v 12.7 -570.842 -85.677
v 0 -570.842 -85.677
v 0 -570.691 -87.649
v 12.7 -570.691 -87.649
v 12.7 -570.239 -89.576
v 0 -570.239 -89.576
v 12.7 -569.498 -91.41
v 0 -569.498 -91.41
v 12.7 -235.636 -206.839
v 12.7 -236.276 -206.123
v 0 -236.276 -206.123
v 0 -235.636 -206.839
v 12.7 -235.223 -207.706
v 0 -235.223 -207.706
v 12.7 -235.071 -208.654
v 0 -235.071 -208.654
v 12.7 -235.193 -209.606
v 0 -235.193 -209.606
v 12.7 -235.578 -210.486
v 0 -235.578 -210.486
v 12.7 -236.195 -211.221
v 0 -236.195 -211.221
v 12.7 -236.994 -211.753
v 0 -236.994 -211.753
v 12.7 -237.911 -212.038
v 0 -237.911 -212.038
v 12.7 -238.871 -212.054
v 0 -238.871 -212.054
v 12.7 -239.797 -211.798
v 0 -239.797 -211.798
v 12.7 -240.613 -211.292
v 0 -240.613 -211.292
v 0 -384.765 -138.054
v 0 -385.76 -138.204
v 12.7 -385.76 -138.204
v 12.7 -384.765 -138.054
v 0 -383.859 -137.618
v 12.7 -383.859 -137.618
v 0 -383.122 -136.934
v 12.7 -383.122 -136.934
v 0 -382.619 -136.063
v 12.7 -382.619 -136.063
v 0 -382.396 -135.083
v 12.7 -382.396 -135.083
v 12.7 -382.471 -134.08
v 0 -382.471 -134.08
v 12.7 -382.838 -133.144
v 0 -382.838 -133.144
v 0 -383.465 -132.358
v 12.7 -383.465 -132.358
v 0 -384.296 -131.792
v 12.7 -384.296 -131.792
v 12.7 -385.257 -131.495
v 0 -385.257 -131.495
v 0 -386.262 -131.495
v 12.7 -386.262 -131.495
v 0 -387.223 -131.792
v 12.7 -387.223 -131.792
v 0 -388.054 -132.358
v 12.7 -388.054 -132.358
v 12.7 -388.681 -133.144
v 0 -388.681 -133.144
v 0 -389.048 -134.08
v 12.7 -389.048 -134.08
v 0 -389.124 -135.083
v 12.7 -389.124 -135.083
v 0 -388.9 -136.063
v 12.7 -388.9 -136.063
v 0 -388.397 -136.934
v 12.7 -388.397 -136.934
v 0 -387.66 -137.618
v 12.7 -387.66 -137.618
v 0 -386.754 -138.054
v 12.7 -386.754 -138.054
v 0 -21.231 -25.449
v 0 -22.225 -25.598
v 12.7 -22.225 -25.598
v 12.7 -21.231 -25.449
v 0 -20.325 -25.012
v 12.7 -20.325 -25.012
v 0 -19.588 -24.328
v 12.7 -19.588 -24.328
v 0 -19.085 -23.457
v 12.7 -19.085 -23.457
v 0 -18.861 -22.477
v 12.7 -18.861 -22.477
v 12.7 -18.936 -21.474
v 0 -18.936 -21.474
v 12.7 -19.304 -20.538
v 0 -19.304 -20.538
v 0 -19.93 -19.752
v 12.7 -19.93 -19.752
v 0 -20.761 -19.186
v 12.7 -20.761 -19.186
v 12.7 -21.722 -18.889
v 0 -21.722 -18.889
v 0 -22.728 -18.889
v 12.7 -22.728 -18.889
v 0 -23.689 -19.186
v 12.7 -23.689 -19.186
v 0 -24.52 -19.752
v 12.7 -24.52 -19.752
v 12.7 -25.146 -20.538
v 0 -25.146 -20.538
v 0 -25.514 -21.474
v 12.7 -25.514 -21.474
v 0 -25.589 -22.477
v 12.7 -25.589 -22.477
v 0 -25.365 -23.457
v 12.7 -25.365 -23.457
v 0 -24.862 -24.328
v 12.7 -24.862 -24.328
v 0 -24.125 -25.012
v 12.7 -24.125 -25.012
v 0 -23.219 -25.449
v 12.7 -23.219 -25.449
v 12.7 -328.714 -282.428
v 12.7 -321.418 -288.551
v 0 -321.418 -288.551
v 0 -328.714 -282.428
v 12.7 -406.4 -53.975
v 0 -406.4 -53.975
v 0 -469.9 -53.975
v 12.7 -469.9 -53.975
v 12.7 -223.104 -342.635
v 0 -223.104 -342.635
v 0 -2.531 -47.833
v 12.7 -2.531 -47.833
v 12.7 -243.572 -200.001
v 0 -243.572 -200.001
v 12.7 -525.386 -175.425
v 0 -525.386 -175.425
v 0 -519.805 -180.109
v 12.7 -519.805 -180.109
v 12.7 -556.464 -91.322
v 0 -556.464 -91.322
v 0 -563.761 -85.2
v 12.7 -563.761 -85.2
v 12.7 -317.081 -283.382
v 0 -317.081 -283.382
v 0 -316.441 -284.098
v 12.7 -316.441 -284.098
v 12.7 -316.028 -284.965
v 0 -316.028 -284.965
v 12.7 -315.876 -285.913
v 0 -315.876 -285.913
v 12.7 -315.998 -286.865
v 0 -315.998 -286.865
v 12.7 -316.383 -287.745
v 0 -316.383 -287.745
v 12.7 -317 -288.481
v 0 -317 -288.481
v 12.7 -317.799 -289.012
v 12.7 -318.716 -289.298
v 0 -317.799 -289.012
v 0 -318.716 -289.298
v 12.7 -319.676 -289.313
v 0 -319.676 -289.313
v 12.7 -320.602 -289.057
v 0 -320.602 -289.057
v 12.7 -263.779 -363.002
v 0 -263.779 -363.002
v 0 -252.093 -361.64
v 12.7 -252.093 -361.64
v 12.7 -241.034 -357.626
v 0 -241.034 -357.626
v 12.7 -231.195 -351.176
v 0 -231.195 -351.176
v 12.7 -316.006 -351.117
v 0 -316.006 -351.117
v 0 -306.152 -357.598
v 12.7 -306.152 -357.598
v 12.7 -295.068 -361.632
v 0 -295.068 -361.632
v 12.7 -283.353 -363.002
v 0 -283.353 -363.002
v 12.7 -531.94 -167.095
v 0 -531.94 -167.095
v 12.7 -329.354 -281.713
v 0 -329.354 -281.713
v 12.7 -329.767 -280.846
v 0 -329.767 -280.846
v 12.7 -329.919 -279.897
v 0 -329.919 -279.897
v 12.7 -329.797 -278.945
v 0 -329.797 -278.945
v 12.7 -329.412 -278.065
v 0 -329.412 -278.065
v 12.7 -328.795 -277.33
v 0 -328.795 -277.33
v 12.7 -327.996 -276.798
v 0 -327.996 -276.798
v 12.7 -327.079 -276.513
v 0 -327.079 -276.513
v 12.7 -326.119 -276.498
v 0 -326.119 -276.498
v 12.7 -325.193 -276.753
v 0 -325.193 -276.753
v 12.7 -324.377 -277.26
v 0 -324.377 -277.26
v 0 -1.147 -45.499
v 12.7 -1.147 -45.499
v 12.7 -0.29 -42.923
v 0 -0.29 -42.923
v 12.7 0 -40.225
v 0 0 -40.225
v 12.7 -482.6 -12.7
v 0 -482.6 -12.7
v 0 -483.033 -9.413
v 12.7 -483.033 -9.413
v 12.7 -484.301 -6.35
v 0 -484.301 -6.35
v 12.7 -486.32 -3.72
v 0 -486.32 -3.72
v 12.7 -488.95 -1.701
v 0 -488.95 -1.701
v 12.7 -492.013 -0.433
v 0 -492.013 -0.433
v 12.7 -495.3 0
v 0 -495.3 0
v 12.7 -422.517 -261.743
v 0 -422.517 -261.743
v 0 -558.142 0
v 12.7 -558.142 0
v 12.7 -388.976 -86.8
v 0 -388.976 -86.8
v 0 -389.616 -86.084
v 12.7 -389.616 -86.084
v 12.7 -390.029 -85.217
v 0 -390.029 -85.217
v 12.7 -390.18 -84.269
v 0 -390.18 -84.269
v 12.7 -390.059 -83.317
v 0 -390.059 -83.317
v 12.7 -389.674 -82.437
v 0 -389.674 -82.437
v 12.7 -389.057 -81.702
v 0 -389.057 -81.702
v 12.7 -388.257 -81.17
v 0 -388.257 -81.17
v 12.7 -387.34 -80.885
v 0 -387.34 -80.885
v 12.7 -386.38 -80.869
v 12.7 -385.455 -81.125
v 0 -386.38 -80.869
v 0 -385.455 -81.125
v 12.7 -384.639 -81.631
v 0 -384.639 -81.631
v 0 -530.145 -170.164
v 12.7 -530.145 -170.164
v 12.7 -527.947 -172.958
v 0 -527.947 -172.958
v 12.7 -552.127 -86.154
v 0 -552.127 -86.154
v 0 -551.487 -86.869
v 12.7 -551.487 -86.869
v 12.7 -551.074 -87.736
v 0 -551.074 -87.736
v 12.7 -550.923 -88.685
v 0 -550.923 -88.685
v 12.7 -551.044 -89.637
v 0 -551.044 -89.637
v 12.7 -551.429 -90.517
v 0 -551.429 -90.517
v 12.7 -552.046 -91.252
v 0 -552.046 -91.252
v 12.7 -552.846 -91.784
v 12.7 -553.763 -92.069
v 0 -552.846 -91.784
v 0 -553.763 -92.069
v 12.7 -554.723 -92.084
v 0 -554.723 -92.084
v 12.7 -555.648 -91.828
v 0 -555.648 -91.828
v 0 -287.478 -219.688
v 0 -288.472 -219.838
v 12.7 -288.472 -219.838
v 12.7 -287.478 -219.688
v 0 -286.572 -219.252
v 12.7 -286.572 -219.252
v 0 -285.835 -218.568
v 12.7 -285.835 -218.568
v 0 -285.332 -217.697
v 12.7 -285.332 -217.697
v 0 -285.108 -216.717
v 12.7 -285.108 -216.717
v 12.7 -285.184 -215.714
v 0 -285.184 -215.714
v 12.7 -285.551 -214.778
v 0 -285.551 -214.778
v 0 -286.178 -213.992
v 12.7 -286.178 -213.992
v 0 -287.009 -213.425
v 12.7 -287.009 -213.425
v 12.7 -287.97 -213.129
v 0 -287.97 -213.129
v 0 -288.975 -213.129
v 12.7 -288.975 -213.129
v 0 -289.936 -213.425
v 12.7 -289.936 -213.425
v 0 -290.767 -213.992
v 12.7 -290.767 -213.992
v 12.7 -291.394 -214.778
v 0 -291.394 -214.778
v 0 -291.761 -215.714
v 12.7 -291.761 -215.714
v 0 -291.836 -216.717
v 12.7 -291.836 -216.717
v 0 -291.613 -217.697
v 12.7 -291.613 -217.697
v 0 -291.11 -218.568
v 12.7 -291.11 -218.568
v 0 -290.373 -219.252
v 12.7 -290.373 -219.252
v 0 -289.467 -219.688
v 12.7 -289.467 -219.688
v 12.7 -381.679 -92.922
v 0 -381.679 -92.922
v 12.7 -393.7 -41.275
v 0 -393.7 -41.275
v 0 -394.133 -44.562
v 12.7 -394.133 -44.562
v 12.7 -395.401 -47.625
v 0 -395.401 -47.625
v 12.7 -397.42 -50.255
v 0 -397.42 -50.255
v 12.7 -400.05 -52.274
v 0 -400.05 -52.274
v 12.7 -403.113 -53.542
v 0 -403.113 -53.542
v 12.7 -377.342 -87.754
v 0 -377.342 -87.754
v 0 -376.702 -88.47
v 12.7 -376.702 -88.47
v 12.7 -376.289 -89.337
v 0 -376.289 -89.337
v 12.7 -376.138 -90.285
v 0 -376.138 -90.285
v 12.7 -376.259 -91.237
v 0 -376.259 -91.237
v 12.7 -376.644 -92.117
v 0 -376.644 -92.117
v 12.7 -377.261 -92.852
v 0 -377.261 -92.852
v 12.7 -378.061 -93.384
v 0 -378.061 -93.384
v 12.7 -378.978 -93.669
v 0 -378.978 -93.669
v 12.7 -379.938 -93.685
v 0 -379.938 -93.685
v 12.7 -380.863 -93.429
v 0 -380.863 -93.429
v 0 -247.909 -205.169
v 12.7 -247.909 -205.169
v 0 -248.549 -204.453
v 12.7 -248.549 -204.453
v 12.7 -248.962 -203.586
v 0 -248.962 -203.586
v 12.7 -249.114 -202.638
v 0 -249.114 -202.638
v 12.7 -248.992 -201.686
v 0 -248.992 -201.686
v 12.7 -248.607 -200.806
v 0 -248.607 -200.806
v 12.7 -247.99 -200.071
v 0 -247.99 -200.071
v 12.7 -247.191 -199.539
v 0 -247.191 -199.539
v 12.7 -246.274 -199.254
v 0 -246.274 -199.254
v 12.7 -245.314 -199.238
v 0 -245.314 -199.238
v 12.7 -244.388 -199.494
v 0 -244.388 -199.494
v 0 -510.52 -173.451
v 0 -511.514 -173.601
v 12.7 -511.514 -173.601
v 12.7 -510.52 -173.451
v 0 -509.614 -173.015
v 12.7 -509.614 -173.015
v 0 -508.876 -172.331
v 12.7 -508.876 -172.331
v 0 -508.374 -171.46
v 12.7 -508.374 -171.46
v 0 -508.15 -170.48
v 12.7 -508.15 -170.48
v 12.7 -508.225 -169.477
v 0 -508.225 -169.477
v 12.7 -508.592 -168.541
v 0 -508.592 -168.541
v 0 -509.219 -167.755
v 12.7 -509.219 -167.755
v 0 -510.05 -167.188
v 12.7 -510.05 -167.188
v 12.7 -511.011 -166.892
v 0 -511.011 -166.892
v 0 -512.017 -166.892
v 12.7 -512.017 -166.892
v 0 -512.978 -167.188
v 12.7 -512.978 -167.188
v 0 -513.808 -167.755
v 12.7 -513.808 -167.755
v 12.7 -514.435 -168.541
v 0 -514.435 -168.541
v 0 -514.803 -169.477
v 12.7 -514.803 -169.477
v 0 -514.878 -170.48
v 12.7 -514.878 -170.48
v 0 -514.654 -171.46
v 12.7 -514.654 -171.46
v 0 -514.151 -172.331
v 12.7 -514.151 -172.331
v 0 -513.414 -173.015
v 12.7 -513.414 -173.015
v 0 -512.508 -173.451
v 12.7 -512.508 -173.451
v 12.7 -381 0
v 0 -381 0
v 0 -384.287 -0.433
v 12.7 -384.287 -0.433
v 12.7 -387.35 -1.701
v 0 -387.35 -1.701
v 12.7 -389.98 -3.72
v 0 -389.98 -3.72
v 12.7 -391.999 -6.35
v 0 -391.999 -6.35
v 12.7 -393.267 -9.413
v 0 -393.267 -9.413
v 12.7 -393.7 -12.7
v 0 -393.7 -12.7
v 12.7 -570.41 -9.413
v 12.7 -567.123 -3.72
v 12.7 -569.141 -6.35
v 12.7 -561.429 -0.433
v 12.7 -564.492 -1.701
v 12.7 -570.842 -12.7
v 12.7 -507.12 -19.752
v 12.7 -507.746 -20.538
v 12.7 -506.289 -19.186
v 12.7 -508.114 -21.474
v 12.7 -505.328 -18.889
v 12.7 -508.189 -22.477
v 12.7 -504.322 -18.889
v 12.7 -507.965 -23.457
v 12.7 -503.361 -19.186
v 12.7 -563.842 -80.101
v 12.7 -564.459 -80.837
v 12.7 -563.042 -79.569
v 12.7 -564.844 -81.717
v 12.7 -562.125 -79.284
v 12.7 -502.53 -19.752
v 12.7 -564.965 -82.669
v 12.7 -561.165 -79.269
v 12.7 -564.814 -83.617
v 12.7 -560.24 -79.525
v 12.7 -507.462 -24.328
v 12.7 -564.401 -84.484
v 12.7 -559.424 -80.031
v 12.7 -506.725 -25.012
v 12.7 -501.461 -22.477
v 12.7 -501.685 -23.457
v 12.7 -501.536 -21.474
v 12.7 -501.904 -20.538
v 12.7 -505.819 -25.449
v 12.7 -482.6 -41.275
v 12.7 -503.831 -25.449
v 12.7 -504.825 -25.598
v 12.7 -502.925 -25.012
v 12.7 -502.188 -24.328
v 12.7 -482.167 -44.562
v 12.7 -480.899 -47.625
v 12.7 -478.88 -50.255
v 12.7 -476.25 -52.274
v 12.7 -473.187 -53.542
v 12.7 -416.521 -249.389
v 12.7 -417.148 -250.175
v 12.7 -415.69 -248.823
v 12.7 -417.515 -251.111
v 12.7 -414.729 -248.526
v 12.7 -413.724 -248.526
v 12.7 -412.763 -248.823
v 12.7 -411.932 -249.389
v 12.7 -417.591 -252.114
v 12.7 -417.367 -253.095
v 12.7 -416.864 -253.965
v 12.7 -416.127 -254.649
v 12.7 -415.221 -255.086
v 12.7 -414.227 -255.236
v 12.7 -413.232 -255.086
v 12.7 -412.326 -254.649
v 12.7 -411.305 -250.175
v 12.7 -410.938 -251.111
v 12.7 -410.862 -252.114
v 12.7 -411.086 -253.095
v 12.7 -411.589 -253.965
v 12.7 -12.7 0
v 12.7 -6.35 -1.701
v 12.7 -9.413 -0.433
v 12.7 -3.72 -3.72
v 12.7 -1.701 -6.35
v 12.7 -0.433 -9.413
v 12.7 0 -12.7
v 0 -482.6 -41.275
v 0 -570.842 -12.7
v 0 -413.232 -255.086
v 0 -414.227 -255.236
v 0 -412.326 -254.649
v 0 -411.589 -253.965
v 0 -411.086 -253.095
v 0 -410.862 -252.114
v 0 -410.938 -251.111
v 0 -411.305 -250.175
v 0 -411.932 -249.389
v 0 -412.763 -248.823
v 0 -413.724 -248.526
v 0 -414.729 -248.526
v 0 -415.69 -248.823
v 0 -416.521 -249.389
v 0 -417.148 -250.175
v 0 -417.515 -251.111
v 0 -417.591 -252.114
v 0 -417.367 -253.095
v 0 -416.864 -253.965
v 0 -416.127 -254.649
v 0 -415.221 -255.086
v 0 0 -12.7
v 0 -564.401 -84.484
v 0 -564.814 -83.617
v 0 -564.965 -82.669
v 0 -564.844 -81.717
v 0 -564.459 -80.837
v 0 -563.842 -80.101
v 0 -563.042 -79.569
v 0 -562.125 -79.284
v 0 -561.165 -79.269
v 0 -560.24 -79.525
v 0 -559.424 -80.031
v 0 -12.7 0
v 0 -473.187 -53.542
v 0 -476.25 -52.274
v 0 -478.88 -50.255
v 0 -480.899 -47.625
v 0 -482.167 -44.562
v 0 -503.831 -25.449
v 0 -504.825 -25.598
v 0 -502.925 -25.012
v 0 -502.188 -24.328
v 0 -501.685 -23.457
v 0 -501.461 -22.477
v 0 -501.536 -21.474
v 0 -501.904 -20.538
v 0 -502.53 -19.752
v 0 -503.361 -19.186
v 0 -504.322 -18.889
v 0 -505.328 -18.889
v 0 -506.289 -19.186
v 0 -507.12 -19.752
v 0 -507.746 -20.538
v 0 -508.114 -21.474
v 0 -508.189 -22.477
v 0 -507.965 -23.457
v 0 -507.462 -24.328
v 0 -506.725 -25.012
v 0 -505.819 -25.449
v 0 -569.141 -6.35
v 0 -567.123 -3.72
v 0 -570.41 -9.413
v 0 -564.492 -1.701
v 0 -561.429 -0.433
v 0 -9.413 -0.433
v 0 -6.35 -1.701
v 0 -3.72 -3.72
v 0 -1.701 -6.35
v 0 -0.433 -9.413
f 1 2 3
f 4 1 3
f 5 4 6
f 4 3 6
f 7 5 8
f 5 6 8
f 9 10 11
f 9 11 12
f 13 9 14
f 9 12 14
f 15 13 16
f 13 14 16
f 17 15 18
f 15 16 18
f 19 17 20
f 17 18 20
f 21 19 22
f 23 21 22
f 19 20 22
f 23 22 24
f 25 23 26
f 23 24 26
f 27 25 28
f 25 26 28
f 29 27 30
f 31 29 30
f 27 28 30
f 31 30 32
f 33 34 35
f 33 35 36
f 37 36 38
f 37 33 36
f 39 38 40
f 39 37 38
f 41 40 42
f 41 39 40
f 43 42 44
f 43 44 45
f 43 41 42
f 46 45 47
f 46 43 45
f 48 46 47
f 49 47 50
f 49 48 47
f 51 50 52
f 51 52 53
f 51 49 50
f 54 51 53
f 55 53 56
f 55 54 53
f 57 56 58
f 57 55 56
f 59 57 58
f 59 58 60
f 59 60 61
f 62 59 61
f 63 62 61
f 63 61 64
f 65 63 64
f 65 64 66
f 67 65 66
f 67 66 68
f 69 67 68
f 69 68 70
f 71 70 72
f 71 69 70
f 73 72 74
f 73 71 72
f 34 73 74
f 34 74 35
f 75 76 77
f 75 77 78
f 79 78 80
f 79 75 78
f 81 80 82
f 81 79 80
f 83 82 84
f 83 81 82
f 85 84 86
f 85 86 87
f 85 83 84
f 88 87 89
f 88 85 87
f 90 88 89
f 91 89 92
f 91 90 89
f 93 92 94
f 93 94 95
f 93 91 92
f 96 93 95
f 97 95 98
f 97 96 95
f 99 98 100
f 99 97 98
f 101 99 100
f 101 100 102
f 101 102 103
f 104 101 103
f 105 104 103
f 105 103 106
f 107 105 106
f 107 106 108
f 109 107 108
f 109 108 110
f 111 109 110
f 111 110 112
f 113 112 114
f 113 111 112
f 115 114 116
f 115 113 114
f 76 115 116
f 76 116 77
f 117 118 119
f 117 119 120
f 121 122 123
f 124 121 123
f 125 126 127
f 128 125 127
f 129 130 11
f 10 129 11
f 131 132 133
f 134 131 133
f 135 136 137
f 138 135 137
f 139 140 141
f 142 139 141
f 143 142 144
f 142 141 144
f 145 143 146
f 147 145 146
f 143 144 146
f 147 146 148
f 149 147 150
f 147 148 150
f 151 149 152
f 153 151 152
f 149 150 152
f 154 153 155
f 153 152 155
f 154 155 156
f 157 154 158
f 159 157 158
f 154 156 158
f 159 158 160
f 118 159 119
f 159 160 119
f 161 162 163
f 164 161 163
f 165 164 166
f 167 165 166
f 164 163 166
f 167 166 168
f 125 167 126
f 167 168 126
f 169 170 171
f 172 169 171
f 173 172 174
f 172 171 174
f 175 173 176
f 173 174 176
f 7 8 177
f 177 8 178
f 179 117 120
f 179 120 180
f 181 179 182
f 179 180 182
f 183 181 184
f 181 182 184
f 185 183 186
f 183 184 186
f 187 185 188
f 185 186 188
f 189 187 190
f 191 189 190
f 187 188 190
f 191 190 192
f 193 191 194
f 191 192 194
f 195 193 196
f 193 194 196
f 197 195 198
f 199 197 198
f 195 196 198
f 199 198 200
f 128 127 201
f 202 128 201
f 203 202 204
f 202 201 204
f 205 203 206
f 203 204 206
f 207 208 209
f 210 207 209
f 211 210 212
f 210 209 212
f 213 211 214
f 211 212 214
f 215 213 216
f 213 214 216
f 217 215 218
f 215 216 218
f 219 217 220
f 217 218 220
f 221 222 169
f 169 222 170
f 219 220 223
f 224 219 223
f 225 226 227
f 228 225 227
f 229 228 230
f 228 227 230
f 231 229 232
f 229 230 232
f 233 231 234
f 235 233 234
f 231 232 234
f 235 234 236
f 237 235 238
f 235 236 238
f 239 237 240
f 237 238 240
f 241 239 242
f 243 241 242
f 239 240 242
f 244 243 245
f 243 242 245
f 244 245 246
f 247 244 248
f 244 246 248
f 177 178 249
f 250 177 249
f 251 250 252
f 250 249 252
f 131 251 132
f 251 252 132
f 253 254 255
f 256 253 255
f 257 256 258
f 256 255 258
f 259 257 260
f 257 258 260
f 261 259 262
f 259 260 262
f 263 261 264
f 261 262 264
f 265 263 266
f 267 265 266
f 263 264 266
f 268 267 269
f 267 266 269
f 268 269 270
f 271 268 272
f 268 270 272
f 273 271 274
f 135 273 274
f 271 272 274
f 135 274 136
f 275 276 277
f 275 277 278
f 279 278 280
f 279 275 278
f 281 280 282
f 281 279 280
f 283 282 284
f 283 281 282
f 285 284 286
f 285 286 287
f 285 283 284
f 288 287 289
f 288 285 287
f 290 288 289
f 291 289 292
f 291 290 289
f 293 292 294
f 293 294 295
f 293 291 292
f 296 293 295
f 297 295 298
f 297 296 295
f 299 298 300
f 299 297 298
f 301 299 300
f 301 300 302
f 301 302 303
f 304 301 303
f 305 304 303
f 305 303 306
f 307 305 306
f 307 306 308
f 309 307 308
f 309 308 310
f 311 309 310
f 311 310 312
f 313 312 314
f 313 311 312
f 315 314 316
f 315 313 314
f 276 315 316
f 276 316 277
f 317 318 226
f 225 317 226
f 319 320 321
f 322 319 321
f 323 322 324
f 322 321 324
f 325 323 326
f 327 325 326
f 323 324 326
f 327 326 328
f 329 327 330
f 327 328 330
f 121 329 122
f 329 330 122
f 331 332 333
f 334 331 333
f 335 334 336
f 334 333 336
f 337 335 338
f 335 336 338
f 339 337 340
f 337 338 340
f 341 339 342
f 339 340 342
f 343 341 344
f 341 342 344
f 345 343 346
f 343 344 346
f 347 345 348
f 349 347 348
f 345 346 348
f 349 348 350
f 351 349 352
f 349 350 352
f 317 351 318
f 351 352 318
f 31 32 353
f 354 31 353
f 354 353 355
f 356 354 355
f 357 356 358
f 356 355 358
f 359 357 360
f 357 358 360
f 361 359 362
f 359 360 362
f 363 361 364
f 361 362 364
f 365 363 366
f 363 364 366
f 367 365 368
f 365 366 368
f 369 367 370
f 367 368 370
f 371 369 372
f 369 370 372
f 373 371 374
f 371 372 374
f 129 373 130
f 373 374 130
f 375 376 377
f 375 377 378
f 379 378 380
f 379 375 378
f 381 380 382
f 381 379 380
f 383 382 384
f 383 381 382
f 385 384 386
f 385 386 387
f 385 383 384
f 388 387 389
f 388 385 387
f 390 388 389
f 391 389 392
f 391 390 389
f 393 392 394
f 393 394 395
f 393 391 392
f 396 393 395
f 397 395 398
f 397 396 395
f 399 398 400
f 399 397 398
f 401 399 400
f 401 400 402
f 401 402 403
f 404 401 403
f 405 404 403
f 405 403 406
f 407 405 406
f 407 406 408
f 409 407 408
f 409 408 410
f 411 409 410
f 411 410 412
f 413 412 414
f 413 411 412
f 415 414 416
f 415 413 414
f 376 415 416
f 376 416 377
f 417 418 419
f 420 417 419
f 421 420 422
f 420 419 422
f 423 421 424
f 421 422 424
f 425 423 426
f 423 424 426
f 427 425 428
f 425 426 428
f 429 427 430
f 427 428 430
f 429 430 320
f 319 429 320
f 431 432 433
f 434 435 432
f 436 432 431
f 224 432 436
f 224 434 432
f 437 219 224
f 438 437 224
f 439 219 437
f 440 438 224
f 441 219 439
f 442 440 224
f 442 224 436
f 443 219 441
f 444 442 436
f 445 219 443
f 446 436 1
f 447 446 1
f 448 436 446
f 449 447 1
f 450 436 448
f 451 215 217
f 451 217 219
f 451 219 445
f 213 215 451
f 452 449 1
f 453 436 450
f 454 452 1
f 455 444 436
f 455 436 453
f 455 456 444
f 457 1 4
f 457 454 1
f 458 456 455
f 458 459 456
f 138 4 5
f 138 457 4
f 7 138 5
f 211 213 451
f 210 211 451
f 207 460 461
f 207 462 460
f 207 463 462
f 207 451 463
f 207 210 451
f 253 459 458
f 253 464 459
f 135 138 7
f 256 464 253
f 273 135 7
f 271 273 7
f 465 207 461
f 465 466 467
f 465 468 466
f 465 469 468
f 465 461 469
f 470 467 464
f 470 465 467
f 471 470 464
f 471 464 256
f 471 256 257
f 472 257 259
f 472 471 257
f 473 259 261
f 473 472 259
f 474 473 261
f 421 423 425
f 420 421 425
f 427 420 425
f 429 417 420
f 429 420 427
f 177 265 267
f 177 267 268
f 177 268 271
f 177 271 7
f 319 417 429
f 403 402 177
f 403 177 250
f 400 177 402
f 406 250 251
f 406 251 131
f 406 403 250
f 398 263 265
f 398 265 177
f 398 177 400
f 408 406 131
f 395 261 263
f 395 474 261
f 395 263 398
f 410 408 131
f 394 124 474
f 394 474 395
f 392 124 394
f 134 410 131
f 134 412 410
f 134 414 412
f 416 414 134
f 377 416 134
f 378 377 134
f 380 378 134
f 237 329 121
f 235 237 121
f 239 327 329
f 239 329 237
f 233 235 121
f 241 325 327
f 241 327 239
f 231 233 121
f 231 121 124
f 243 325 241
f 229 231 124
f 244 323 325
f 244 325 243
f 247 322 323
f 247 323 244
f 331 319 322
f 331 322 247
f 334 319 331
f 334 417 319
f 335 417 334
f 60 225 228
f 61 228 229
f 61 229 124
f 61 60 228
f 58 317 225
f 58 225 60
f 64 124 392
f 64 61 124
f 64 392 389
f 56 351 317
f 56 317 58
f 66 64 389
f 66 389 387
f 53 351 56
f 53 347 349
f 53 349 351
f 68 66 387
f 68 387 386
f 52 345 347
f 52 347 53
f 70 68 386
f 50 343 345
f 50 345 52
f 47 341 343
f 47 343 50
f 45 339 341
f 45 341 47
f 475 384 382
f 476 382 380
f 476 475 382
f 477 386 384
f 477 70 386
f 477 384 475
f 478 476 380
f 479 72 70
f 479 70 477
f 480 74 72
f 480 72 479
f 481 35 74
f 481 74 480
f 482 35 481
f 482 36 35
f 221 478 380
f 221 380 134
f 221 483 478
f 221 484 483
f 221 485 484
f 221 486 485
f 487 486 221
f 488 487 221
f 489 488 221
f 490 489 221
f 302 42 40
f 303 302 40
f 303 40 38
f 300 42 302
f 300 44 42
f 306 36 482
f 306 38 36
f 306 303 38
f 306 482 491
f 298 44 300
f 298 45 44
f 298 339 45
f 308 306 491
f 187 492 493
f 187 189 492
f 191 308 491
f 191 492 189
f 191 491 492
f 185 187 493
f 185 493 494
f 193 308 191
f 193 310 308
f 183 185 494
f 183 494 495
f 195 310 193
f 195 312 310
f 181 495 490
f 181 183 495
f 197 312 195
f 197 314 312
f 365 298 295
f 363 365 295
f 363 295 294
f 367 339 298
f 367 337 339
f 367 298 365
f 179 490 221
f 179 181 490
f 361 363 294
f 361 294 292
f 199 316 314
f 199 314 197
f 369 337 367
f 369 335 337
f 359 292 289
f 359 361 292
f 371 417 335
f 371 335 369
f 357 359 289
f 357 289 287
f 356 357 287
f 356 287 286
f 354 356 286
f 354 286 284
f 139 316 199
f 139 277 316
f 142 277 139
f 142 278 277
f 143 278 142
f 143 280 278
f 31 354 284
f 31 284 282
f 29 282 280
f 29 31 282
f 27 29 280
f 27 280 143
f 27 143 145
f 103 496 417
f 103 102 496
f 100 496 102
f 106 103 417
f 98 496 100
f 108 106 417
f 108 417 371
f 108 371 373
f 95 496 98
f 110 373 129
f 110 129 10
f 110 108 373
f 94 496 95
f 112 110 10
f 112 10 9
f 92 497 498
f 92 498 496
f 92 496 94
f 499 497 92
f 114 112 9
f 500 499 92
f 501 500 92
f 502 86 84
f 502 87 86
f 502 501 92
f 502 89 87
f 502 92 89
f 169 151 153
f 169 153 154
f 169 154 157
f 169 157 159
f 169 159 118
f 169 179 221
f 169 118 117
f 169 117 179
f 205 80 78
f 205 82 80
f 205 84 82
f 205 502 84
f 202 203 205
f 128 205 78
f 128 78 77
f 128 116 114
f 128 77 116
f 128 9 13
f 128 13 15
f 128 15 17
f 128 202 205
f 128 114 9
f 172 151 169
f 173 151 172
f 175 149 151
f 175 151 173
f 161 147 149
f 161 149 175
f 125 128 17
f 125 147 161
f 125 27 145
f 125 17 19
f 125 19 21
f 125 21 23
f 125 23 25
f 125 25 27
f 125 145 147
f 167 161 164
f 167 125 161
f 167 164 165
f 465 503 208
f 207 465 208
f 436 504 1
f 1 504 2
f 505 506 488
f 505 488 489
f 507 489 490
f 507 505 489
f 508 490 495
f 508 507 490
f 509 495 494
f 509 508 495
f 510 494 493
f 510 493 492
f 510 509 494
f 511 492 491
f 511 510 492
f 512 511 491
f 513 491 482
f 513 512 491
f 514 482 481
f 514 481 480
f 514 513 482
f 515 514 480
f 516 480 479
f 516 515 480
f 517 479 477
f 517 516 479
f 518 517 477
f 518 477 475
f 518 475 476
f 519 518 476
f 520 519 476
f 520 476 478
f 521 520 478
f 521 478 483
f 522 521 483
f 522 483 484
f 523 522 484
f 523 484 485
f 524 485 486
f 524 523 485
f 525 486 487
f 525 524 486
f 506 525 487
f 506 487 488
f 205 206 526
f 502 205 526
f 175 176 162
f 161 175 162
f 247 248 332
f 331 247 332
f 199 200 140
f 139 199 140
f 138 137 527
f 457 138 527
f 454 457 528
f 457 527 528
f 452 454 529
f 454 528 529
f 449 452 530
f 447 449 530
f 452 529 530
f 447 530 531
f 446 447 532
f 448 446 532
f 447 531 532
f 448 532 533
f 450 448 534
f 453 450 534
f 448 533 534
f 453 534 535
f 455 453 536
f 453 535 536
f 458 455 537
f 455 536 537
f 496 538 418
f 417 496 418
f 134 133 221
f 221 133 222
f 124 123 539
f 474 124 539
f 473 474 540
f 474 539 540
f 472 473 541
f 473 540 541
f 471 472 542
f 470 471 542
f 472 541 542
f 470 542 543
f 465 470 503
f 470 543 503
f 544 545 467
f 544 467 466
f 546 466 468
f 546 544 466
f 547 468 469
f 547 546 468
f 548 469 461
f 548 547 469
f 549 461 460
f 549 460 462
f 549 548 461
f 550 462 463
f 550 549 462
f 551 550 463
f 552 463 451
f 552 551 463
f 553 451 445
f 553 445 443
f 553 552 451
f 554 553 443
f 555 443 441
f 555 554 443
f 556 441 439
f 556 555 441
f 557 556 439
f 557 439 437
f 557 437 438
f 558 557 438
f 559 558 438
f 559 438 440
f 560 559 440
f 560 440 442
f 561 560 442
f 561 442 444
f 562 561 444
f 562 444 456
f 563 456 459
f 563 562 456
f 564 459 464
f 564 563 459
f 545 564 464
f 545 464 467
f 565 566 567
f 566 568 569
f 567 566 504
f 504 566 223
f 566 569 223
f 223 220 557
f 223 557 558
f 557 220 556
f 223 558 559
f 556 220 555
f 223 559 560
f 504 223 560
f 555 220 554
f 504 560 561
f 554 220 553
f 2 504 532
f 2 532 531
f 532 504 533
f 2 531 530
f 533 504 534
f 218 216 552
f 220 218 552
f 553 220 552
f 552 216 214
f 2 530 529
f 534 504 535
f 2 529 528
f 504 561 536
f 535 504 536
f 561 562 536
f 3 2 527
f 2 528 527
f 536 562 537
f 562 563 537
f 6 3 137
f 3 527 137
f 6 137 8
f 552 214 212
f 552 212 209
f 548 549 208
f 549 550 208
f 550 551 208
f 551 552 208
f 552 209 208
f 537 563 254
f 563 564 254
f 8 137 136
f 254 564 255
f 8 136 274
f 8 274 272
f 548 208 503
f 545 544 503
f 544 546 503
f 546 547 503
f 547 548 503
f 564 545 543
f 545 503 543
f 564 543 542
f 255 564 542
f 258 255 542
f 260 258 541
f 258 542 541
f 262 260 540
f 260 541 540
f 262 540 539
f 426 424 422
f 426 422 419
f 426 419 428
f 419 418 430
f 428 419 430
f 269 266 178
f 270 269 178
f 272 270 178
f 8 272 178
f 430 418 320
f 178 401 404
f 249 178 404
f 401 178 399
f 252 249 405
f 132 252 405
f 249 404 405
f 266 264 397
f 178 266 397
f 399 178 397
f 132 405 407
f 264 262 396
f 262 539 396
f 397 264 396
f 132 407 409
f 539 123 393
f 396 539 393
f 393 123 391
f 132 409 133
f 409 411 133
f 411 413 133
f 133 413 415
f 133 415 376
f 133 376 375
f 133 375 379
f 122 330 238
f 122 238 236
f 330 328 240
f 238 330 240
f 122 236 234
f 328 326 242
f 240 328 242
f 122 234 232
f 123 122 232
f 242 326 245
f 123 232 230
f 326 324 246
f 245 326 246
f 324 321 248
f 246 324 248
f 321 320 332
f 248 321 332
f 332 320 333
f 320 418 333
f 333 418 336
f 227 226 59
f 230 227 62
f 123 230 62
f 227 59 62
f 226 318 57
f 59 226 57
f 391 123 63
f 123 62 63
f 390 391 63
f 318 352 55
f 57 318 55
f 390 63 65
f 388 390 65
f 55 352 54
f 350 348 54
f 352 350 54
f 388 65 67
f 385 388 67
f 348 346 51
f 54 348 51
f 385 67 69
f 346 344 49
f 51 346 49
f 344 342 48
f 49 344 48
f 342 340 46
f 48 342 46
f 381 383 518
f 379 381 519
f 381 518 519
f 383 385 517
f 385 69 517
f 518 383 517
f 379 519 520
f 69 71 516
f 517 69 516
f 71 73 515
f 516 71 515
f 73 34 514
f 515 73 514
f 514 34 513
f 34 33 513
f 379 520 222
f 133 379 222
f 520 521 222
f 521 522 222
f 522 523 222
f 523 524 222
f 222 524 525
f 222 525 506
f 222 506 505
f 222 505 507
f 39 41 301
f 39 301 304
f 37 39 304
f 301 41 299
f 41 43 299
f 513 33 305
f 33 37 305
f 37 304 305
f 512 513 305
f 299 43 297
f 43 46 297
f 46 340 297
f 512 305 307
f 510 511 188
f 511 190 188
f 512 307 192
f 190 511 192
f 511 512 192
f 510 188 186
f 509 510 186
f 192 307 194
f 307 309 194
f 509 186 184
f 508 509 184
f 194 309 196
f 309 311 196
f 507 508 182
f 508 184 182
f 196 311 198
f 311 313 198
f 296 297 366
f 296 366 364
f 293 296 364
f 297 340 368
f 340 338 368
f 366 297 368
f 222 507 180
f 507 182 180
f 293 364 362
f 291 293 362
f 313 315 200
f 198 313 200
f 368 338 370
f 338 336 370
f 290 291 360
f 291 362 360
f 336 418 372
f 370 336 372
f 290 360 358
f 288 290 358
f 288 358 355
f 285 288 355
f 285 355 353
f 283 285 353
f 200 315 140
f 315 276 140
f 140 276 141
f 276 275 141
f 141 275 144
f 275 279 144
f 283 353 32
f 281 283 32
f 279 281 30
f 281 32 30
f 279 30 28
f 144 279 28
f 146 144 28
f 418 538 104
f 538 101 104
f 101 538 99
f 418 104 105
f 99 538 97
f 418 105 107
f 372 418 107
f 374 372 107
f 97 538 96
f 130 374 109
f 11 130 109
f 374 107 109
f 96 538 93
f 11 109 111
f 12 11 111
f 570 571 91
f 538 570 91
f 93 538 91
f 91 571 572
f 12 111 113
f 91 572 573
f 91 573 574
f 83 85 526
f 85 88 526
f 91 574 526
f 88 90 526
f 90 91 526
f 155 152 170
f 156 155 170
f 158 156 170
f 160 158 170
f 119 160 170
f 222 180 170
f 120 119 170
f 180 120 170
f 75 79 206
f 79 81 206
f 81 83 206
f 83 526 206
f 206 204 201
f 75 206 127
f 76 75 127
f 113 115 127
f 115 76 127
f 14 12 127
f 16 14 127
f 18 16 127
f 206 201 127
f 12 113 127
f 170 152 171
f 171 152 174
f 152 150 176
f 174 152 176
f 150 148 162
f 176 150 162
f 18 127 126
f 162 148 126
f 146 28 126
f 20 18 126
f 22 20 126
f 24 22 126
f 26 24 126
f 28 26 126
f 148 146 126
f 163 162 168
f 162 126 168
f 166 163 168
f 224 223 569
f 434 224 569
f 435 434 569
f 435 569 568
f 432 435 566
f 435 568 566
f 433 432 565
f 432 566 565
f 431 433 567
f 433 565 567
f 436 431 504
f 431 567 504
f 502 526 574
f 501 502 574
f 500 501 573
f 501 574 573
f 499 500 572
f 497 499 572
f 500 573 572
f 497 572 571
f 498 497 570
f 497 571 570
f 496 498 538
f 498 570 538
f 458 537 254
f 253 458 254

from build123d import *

# Parameters (mm, degrees)
SKETCH1_R           = 3.3734375
BOSS_EXTRUDE1_DEPTH = 12.7


with BuildPart() as part:
    # Sketch1 → Boss-Extrude1 (new body)
    with BuildSketch(Plane(origin=(0, 0, 0), x_dir=(0, 0, -1), z_dir=(1, 0, 0))):
        with BuildLine():
            Line((0, -12.7), (0, -381))
            ThreePointArc((0, -381), (3.719743879, -389.980256121), (12.7, -393.7))
            Line((12.7, -393.7), (41.275, -393.7))
            ThreePointArc((41.275, -393.7), (50.255256121, -397.419743879), (53.975, -406.4))
            Line((53.975, -406.4), (53.975, -469.9))
            ThreePointArc((53.975, -469.9), (50.255256121, -478.880256121), (41.275, -482.6))
            Line((41.275, -482.6), (12.7, -482.6))
            ThreePointArc((12.7, -482.6), (3.719743879, -486.319743879), (0, -495.3))
            Line((0, -495.3), (0, -558.1424575))
            ThreePointArc((0, -558.1424575), (3.719743879, -567.122713621), (12.7, -570.8424575))
            Line((12.7, -570.8424575), (85.67674, -570.8424575))
            ThreePointArc((85.67674, -570.8424575), (88.621267556, -570.501864059), (91.410289955, -569.498071015))
            Line((91.410289955, -569.498071015), (167.095255646, -531.940375361))
            ThreePointArc((167.095255646, -531.940375361), (171.599093022, -529.093805409), (175.425396365, -525.386122262))
            Line((175.425396365, -525.386122262), (180.108605599, -519.804919463))
            Line((180.108605599, -519.804919463), (261.742877776, -422.517481393))
            Line((261.742877776, -422.517481393), (351.116781651, -316.006356758))
            ThreePointArc((351.116781651, -316.006356758), (359.938169615, -300.727331458), (363.001806424, -283.352647887))
            Line((363.001806424, -283.352647887), (363.001806424, -263.778902144))
            ThreePointArc((363.001806424, -263.778902144), (357.625647598, -241.034349984), (342.635087803, -223.103905101))
            Line((342.635087803, -223.103905101), (47.83309284, -2.531250739))
            ThreePointArc((47.83309284, -2.531250739), (44.233942259, -0.649416703), (40.224772495, 0))
            Line((40.224772495, 0), (12.7, 0))
            ThreePointArc((12.7, 0), (3.719743879, -3.719743879), (0, -12.7))
        make_face()
        with Locations((22.225, -22.225)):
            Circle(SKETCH1_R, mode=Mode.SUBTRACT)
        with Locations((22.225, -504.825)):
            Circle(SKETCH1_R, mode=Mode.SUBTRACT)
        with Locations((216.464615836, -288.472417571)):
            Circle(SKETCH1_R, mode=Mode.SUBTRACT)
        with Locations((134.830886903, -385.759530517)):
            Circle(SKETCH1_R, mode=Mode.SUBTRACT)
        with Locations((170.22785017, -511.513938695)):
            Circle(SKETCH1_R, mode=Mode.SUBTRACT)
        with Locations((251.862122347, -414.226500625)):
            Circle(SKETCH1_R, mode=Mode.SUBTRACT)
        with BuildLine():
            Line((81.631459634, -384.638877782), (87.754018145, -377.342309939))
            ThreePointArc((87.754018145, -377.342309939), (92.506625395, -376.926514968), (92.922420366, -381.679122218))
            Line((92.922420366, -381.679122218), (86.799861855, -388.975690061))
            ThreePointArc((86.799861855, -388.975690061), (82.047254605, -389.391485032), (81.631459634, -384.638877782))
        make_face(mode=Mode.SUBTRACT)
        with BuildLine():
            Line((211.291500366, -240.612602218), (205.168941855, -247.909170061))
            ThreePointArc((205.168941855, -247.909170061), (200.416334605, -248.324965032), (200.000539634, -243.572357782))
            Line((200.000539634, -243.572357782), (206.123098145, -236.275789939))
            ThreePointArc((206.123098145, -236.275789939), (210.875705395, -235.859994968), (211.291500366, -240.612602218))
        make_face(mode=Mode.SUBTRACT)
        with BuildLine():
            Line((288.55068278, -321.417631427), (282.428112367, -328.714189282))
            ThreePointArc((282.428112367, -328.714189282), (277.675504439, -329.129976501), (277.25971722, -324.377368573))
            Line((277.25971722, -324.377368573), (283.382287633, -317.080810718))
            ThreePointArc((283.382287633, -317.080810718), (288.134895561, -316.665023499), (288.55068278, -321.417631427))
        make_face(mode=Mode.SUBTRACT)
        with BuildLine():
            Line((80.03125722, -559.423888573), (86.153827633, -552.127330718))
            ThreePointArc((86.153827633, -552.127330718), (90.906435561, -551.711543499), (91.32222278, -556.464151427))
            Line((91.32222278, -556.464151427), (85.199652367, -563.760709282))
            ThreePointArc((85.199652367, -563.760709282), (80.447044439, -564.176496501), (80.03125722, -559.423888573))
        make_face(mode=Mode.SUBTRACT)
    extrude(amount=BOSS_EXTRUDE1_DEPTH)


solid = part.part
